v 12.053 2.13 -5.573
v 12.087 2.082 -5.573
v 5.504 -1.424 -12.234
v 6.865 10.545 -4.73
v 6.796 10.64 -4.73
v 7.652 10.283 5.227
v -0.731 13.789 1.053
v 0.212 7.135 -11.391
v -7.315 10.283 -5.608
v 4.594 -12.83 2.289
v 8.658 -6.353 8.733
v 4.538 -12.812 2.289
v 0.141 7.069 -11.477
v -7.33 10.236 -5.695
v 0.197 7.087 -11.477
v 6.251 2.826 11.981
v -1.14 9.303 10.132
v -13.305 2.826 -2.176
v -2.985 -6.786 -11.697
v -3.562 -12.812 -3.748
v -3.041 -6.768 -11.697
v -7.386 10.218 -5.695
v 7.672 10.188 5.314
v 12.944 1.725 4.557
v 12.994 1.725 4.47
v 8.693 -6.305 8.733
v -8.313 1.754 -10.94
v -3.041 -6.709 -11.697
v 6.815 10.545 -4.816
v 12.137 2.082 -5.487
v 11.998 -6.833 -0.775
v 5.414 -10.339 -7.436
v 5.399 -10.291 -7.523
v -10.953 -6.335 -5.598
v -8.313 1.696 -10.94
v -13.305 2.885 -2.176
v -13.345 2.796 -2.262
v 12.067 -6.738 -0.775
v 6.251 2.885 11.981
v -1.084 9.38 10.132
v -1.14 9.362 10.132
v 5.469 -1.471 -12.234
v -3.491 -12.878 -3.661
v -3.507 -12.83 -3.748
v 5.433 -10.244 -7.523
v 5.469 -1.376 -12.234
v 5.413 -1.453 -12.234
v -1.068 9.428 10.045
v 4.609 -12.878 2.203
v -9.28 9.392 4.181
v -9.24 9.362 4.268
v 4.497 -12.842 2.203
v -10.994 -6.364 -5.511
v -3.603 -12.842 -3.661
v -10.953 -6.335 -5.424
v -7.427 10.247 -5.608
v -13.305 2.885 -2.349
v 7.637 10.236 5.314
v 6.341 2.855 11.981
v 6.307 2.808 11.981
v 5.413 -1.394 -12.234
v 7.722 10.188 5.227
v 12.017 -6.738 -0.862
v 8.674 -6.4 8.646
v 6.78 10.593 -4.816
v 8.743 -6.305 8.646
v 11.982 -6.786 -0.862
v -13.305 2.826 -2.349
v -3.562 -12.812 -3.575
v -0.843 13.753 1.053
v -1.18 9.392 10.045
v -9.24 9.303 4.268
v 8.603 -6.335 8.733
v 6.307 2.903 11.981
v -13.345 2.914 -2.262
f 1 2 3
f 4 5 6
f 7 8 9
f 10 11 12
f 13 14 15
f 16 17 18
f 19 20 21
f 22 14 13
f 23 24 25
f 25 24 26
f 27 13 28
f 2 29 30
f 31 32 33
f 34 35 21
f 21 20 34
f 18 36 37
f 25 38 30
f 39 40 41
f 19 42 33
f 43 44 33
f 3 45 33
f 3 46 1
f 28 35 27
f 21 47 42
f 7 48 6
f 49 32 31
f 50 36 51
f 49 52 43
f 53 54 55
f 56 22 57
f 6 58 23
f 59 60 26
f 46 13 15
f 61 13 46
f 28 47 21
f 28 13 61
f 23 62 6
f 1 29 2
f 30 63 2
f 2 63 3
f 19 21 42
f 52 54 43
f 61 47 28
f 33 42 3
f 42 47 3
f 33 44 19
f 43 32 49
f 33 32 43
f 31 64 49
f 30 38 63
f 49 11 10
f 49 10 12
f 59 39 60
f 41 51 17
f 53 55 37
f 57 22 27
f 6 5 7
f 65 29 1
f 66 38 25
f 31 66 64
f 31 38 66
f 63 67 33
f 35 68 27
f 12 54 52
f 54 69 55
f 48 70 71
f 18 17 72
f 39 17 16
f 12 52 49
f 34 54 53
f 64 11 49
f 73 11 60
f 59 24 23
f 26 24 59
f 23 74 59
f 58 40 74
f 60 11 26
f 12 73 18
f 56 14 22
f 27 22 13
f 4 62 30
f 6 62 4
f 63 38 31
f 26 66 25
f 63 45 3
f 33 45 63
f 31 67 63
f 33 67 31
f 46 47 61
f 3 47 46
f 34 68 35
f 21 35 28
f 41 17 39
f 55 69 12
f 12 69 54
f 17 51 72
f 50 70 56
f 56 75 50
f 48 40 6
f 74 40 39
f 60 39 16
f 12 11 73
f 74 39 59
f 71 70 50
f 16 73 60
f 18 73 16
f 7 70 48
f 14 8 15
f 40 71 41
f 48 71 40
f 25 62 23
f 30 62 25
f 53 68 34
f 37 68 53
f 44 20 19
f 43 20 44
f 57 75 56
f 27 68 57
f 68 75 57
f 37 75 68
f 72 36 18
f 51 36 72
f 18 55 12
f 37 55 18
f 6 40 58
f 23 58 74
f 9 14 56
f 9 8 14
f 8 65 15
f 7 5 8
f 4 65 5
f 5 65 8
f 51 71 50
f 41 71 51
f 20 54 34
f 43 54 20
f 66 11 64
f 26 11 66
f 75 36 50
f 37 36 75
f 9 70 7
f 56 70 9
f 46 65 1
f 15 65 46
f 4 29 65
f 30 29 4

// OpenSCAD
// Auto-generated OpenSCAD file

    inner_points = 10*[[-0.8272709439258851, 0.17250574680152558, -1.085356370379995], [-0.3000208722060624, -0.673824517218672, -1.1610692891914136], [0.7621572748828489, 1.018836010821184, 0.5227077285305861], [1.2894073466026714, 0.17250574680098618, 0.44699480971916755], [-0.7345602979402426, 1.0188360108215655, -0.5608281820767405], [0.53833397596794, -1.0243859908227981, -0.74361533751812], [-0.07619757329115358, 1.3693974844253103, 0.10525377685729254], [1.1966967006170288, -0.6738245172190535, -0.0775333785840871], [-1.0912605548199168, -0.6305363851239965, -0.5510972387851012], [0.6291241521432895, 0.2855248915222844, 1.189458799445929], [-0.9199536182758472, 0.9332780322219801, 0.41810447601210515], [0.4578172155992198, -1.278289525823692, 0.22025708464872243], [-1.326431597387023, 0.2855248915227826, -0.22624909246720426], [-0.3522004978329189, -1.2782895258234854, -0.36614832454032104], [-0.10993590484370842, 0.9332780322217736, 1.0045098852011487], [0.8642951947103956, -0.6305363851244946, 0.864610653128032], [0.018107748679271438, 0.7039670605239071, -1.1390568182894552], [0.5453578203990939, -0.14236320349629056, -1.2147697371008737], [0.6764704733283603, 1.054528534127652, -0.47297485935542216], [1.203720545048183, 0.20819827010745423, -0.5486877781668408]];

    outer_points = 10*[[0.8642951947101556, -0.6305363851244028, -0.8646106531284449], [0.6291241521429305, 0.28552489152246463, -1.1894587994460062], [-1.0912605548197898, -0.6305363851244028, 0.551097238785195], [-1.3264315973870149, 0.28552489152246463, 0.22624909246763364], [0.45781721559917127, -1.2782895258238085, -0.2202570846492242], [-0.10993590484404386, 0.9332780322218704, -1.0045098852008405], [-0.35220049783281543, -1.2782895258238085, 0.3661483245400292], [-0.9199536182760306, 0.9332780322218704, -0.41810447601158707], [1.2894073466025096, 0.17250574680096908, -0.4469948097194502], [-0.8272709439256501, 0.17250574680096908, 1.0853563703802613], [0.5383339759681318, -1.0243859908232005, 0.7436153375176736], [-0.0761975732912725, 1.3693974844251389, -0.1052537768568624], [1.1966967006170348, -0.6738245172192313, 0.07753337858357512], [0.7621572748826352, 1.0188360108211696, -0.5227077285304783], [-0.3000208722057758, -0.6738245172192313, 1.1610692891912895], [-0.7345602979401754, 1.0188360108211696, 0.5608281820772362], [-0.08831976886428294, -0.9141133036386847, -0.9746509296639724], [-0.323490811431508, 0.001947973008182724, -1.299499075981534], [-0.8983374822962696, -0.9141133036386847, -0.38824552047471894], [-1.1335085248634946, 0.001947973008182724, -0.7130936667922804]];

    // Convex hull for inner set (I)
    module inner_hull() {
        hull() {
            for (p = inner_points) {
                translate(p) sphere(r=0.1);
            }
        }
    }

    // Convex hull for outer set (O) minus inner hull (O \ I)
    module outer_minus_inner() {
        difference() {
            hull() {
                for (p = outer_points) {
                    translate(p) sphere(r=0.1);
                }
            }
            inner_hull(); // Subtract inner hull
        }
    }

    // Convex hull for outer set (O) minus all translated inner hulls
    module outer_minus_AllTranslationInner() {
        difference() {
            hull() {
                for (p = outer_points) {
                    translate(p) sphere(r=0.1);
                }
            }
            hull() {
                translate([0,0,50]) inner_hull();
                translate([0,0,-50]) inner_hull();
            }; // Subtract translated inner hulls
        }
    }

    // Difference between outer_minus_inner and outer_minus_AllTranslationInner
    module outer_minus_inner_diff() {
        difference() {
            // Outer minus inner
            difference() {
                hull() {
                    for (p = outer_points) {
                        translate(p) sphere(r=0.1);
                    }
                }
                inner_hull();
            }

            // Subtract Outer minus AllTranslationInner
            difference() {
                hull() {
                    for (p = outer_points) {
                        translate(p) sphere(r=0.1);
                    }
                }
                hull() {
                    translate([0,0,50]) inner_hull();
                    translate([0,0,-50]) inner_hull();
                };
            }
        }
    }

    // Rendering all with colors applied
    color([1, 0, 0, 0.5]) inner_hull(); // Transparent red
    
